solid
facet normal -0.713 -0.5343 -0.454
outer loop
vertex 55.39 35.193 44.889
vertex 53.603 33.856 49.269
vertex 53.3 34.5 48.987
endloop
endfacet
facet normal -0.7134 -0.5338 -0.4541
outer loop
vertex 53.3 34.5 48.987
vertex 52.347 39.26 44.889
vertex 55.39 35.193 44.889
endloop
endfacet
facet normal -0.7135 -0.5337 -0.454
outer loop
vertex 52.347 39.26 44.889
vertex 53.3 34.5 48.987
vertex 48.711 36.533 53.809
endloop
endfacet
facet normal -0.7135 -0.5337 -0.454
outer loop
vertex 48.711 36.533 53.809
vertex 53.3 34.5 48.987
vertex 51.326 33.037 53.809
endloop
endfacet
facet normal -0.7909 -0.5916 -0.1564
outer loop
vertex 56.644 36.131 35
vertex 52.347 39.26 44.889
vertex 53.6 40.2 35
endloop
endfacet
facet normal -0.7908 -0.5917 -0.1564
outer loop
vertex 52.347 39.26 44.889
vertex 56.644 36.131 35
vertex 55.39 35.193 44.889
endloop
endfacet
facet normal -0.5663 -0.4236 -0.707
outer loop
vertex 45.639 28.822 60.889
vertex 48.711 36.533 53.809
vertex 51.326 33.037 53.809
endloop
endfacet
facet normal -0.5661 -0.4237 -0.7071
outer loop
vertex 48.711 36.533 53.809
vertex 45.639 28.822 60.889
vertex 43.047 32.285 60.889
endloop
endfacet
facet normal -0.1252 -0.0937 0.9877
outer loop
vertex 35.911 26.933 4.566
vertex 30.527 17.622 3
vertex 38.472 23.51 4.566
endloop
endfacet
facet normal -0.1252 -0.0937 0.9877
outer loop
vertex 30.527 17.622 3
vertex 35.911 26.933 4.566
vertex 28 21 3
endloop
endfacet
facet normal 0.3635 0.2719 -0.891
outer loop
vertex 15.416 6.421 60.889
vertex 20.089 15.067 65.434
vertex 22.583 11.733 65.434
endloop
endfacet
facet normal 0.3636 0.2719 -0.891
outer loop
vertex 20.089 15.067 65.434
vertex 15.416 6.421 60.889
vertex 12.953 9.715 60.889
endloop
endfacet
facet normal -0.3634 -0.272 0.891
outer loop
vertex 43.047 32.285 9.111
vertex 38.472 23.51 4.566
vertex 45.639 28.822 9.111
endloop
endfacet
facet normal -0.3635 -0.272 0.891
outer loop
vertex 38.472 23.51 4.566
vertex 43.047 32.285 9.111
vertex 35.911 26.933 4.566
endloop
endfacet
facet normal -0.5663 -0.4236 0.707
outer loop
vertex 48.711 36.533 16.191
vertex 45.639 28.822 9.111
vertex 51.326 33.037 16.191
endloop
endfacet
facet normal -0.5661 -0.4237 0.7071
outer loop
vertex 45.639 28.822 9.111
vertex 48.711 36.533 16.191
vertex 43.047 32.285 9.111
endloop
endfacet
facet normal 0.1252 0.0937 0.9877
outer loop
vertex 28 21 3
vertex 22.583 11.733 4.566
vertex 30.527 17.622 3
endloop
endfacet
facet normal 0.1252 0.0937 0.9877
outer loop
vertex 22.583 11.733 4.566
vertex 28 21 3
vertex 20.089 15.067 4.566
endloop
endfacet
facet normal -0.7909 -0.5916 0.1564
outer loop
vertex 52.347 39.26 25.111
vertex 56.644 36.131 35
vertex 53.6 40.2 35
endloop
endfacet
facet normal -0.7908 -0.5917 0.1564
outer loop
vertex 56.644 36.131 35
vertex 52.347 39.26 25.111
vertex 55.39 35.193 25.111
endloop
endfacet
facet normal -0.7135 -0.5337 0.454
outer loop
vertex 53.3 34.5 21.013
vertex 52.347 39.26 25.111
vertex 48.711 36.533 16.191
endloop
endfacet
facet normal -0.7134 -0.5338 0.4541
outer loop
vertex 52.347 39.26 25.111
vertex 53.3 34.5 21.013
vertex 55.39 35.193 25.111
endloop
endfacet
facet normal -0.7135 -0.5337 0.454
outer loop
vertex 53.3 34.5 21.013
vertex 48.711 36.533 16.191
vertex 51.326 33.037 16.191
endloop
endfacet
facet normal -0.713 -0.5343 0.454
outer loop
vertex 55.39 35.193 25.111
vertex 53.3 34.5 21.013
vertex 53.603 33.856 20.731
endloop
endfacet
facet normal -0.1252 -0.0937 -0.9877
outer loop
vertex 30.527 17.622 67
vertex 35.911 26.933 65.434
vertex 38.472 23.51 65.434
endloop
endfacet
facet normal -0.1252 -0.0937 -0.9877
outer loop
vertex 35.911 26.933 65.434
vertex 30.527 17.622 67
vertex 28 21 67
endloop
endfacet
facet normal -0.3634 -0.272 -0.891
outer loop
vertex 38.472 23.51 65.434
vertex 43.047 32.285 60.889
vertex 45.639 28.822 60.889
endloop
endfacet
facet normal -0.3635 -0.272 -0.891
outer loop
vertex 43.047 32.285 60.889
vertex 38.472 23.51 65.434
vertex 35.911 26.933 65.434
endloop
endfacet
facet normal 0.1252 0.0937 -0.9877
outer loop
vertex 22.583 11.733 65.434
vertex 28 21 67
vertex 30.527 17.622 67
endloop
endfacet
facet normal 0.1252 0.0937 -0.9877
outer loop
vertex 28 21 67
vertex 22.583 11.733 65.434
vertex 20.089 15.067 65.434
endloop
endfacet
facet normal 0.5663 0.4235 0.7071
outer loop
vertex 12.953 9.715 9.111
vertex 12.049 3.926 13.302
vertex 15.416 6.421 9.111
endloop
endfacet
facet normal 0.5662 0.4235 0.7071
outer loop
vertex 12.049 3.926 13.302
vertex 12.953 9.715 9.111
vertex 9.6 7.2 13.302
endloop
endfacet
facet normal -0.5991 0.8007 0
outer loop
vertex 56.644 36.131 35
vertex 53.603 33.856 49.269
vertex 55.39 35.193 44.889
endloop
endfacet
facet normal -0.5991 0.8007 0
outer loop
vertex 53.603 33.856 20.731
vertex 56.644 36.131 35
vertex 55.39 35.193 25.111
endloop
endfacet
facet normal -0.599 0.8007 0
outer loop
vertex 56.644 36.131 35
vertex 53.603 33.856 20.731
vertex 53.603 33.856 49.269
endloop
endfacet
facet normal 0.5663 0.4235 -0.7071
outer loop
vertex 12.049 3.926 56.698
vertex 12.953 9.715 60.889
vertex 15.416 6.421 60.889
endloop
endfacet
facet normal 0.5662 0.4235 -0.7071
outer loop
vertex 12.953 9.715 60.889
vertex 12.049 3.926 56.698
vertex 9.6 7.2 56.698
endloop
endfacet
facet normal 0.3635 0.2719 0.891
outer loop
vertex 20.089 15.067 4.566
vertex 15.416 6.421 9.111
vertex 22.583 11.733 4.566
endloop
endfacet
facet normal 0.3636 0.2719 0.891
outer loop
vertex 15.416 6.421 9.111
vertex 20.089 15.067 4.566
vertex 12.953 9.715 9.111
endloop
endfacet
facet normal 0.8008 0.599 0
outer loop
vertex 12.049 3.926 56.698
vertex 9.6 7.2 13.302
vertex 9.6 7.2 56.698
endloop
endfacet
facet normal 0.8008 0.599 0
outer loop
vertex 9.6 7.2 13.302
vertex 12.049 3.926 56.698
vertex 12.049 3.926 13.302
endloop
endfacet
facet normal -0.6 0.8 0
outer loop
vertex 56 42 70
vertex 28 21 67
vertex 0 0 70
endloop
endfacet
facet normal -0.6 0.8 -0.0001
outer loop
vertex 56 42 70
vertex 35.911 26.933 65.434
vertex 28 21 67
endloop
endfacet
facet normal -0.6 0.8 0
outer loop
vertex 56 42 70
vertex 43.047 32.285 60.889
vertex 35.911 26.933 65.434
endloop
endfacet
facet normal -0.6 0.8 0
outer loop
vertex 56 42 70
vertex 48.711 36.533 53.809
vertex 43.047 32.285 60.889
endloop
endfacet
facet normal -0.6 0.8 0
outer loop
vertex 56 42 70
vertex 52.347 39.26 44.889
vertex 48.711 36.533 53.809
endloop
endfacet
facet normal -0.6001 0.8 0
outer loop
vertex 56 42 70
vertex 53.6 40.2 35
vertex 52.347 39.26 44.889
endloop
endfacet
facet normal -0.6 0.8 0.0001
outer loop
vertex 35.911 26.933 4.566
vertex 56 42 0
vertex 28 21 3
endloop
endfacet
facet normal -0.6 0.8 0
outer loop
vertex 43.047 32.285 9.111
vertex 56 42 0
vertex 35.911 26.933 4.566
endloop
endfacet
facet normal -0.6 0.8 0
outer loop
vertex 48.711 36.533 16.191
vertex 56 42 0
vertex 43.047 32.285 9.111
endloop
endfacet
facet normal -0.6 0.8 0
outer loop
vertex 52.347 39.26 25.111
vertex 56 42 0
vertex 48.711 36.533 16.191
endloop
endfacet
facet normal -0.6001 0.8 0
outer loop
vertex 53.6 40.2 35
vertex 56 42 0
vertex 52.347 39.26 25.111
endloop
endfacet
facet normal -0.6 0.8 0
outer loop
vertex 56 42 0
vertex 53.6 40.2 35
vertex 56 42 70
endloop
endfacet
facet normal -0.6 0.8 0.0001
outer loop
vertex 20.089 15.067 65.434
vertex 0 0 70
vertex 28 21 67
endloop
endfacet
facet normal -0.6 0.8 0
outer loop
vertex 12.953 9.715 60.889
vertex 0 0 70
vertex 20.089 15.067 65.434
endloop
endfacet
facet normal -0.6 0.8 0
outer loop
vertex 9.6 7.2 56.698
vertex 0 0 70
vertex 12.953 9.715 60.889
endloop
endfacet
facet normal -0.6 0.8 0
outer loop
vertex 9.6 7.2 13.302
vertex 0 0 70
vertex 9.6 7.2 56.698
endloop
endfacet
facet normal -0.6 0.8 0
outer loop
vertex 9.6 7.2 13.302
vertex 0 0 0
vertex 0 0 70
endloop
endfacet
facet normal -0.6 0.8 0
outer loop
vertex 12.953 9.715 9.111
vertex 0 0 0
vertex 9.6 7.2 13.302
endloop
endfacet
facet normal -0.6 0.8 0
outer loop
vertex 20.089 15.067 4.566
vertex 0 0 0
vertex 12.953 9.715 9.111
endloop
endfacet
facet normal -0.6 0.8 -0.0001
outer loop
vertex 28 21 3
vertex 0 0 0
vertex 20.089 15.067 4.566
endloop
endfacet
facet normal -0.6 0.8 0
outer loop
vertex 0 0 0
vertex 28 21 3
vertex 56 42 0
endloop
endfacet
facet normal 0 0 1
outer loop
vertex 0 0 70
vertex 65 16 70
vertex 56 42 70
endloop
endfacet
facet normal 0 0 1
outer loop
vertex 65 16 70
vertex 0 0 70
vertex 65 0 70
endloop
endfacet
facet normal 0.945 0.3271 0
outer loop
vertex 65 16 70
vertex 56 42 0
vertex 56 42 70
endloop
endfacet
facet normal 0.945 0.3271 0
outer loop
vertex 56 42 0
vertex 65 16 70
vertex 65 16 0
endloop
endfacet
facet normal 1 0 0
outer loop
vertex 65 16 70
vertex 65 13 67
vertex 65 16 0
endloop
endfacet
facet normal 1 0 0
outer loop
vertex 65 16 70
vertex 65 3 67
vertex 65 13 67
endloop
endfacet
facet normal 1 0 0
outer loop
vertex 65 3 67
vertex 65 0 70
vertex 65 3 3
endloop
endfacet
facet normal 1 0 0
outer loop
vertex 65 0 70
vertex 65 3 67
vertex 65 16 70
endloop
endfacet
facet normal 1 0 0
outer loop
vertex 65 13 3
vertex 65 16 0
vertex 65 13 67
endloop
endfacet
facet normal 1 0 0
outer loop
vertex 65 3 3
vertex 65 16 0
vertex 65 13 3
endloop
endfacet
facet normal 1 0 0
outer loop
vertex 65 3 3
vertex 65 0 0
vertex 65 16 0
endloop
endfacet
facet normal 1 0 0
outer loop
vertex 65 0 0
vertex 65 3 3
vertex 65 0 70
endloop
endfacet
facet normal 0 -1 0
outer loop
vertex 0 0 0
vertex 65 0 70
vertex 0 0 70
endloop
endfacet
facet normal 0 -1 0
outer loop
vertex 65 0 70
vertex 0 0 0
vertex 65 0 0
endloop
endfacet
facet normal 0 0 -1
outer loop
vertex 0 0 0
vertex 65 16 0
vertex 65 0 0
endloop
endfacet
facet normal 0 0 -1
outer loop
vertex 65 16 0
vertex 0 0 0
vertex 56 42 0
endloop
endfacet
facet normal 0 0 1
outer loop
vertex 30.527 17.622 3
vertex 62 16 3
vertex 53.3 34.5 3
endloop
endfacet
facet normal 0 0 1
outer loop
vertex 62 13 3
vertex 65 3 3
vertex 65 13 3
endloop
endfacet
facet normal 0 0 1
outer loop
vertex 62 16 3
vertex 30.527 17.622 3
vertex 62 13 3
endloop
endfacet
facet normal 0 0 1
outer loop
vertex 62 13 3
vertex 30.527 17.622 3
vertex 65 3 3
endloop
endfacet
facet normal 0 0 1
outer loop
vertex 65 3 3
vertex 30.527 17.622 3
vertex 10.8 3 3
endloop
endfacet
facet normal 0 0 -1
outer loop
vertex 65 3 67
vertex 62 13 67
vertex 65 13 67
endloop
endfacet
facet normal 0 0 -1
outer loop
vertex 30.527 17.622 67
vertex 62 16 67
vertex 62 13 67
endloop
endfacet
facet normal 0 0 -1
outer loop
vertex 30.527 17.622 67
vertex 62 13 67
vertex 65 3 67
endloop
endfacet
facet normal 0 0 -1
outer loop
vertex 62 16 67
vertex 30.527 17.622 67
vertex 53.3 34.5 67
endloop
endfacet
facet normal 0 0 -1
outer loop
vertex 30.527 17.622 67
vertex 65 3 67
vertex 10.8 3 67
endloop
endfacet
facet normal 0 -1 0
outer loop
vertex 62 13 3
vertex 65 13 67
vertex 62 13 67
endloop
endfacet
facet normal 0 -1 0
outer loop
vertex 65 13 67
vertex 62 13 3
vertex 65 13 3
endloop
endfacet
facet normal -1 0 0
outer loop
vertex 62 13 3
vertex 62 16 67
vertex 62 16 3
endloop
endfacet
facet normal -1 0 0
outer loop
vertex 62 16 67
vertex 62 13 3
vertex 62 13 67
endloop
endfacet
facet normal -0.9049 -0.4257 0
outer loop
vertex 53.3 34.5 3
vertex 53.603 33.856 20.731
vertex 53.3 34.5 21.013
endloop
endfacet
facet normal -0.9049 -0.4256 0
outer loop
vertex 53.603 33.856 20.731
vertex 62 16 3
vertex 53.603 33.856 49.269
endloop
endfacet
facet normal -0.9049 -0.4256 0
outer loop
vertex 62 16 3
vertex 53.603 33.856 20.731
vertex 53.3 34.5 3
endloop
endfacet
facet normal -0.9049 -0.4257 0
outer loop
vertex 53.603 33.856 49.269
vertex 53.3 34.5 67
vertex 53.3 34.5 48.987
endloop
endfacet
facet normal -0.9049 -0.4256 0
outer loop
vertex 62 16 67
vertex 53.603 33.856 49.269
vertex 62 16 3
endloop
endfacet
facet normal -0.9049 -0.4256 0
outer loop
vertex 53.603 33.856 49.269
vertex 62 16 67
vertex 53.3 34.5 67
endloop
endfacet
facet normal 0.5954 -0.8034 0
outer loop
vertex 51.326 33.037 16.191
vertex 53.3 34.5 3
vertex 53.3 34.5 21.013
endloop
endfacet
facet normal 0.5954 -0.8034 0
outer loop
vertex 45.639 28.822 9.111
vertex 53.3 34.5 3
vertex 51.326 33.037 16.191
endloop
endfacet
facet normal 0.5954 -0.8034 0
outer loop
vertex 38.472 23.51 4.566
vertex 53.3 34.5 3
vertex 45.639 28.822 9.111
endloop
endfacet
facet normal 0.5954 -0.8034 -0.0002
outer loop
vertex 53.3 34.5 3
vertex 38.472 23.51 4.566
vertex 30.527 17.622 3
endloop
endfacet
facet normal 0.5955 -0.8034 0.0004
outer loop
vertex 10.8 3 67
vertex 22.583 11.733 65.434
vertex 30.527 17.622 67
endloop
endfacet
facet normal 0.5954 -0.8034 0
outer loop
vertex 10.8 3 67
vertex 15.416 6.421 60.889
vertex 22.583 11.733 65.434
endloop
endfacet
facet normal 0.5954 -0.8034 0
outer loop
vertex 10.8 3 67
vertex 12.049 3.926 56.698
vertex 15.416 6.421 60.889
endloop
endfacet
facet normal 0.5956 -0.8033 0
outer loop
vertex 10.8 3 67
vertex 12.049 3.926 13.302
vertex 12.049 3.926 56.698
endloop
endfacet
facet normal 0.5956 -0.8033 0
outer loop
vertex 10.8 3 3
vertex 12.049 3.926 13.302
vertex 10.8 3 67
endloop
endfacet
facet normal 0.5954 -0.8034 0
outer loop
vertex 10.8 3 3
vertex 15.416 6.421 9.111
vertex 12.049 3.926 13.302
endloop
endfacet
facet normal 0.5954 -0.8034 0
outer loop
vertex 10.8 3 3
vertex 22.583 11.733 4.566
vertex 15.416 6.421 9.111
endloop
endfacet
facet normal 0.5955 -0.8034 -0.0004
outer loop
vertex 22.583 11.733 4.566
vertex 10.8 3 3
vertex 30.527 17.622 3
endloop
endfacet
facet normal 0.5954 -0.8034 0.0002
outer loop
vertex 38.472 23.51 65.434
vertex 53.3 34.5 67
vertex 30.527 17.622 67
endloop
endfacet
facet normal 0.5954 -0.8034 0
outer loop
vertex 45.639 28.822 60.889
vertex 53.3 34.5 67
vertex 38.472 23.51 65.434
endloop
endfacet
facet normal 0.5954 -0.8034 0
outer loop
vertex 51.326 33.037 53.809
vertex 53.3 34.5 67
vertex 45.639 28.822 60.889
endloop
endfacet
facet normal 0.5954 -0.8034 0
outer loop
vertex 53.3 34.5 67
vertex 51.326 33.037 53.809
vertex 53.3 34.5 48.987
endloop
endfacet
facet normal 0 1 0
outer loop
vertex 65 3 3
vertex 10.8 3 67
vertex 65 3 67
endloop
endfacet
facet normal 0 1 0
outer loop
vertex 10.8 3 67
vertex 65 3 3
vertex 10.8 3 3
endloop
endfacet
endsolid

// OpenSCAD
$fn=20;

width=70;
length=100+width/2; 
height=42;

wall = 3;

ro=8;
ri=ro-wall;

// back part
difference() {
	linear_extrude(height=width)
		polygon([[0,0],[length-width,0],[length-width,2*ro],[56,height]]);
	translate([0,0,wall])
		linear_extrude(height=width-2*wall)
		polygon([[3.6*wall,wall],[length-width,wall],[length-width,2*ro-wall],[length-width-wall,2*ro-wall],[length-width-wall,2*ro],[56-0.9*wall,height-2.5*wall]]);
	
	rotate([90,0,36.8])
		translate([(width/2),(width/2),-1])
		difference() {
			cylinder(r=(width/2)-wall, h=wall+3);
			translate([-width/2,-width/2,0])cube([12,width,wall+5]);
		}
}
